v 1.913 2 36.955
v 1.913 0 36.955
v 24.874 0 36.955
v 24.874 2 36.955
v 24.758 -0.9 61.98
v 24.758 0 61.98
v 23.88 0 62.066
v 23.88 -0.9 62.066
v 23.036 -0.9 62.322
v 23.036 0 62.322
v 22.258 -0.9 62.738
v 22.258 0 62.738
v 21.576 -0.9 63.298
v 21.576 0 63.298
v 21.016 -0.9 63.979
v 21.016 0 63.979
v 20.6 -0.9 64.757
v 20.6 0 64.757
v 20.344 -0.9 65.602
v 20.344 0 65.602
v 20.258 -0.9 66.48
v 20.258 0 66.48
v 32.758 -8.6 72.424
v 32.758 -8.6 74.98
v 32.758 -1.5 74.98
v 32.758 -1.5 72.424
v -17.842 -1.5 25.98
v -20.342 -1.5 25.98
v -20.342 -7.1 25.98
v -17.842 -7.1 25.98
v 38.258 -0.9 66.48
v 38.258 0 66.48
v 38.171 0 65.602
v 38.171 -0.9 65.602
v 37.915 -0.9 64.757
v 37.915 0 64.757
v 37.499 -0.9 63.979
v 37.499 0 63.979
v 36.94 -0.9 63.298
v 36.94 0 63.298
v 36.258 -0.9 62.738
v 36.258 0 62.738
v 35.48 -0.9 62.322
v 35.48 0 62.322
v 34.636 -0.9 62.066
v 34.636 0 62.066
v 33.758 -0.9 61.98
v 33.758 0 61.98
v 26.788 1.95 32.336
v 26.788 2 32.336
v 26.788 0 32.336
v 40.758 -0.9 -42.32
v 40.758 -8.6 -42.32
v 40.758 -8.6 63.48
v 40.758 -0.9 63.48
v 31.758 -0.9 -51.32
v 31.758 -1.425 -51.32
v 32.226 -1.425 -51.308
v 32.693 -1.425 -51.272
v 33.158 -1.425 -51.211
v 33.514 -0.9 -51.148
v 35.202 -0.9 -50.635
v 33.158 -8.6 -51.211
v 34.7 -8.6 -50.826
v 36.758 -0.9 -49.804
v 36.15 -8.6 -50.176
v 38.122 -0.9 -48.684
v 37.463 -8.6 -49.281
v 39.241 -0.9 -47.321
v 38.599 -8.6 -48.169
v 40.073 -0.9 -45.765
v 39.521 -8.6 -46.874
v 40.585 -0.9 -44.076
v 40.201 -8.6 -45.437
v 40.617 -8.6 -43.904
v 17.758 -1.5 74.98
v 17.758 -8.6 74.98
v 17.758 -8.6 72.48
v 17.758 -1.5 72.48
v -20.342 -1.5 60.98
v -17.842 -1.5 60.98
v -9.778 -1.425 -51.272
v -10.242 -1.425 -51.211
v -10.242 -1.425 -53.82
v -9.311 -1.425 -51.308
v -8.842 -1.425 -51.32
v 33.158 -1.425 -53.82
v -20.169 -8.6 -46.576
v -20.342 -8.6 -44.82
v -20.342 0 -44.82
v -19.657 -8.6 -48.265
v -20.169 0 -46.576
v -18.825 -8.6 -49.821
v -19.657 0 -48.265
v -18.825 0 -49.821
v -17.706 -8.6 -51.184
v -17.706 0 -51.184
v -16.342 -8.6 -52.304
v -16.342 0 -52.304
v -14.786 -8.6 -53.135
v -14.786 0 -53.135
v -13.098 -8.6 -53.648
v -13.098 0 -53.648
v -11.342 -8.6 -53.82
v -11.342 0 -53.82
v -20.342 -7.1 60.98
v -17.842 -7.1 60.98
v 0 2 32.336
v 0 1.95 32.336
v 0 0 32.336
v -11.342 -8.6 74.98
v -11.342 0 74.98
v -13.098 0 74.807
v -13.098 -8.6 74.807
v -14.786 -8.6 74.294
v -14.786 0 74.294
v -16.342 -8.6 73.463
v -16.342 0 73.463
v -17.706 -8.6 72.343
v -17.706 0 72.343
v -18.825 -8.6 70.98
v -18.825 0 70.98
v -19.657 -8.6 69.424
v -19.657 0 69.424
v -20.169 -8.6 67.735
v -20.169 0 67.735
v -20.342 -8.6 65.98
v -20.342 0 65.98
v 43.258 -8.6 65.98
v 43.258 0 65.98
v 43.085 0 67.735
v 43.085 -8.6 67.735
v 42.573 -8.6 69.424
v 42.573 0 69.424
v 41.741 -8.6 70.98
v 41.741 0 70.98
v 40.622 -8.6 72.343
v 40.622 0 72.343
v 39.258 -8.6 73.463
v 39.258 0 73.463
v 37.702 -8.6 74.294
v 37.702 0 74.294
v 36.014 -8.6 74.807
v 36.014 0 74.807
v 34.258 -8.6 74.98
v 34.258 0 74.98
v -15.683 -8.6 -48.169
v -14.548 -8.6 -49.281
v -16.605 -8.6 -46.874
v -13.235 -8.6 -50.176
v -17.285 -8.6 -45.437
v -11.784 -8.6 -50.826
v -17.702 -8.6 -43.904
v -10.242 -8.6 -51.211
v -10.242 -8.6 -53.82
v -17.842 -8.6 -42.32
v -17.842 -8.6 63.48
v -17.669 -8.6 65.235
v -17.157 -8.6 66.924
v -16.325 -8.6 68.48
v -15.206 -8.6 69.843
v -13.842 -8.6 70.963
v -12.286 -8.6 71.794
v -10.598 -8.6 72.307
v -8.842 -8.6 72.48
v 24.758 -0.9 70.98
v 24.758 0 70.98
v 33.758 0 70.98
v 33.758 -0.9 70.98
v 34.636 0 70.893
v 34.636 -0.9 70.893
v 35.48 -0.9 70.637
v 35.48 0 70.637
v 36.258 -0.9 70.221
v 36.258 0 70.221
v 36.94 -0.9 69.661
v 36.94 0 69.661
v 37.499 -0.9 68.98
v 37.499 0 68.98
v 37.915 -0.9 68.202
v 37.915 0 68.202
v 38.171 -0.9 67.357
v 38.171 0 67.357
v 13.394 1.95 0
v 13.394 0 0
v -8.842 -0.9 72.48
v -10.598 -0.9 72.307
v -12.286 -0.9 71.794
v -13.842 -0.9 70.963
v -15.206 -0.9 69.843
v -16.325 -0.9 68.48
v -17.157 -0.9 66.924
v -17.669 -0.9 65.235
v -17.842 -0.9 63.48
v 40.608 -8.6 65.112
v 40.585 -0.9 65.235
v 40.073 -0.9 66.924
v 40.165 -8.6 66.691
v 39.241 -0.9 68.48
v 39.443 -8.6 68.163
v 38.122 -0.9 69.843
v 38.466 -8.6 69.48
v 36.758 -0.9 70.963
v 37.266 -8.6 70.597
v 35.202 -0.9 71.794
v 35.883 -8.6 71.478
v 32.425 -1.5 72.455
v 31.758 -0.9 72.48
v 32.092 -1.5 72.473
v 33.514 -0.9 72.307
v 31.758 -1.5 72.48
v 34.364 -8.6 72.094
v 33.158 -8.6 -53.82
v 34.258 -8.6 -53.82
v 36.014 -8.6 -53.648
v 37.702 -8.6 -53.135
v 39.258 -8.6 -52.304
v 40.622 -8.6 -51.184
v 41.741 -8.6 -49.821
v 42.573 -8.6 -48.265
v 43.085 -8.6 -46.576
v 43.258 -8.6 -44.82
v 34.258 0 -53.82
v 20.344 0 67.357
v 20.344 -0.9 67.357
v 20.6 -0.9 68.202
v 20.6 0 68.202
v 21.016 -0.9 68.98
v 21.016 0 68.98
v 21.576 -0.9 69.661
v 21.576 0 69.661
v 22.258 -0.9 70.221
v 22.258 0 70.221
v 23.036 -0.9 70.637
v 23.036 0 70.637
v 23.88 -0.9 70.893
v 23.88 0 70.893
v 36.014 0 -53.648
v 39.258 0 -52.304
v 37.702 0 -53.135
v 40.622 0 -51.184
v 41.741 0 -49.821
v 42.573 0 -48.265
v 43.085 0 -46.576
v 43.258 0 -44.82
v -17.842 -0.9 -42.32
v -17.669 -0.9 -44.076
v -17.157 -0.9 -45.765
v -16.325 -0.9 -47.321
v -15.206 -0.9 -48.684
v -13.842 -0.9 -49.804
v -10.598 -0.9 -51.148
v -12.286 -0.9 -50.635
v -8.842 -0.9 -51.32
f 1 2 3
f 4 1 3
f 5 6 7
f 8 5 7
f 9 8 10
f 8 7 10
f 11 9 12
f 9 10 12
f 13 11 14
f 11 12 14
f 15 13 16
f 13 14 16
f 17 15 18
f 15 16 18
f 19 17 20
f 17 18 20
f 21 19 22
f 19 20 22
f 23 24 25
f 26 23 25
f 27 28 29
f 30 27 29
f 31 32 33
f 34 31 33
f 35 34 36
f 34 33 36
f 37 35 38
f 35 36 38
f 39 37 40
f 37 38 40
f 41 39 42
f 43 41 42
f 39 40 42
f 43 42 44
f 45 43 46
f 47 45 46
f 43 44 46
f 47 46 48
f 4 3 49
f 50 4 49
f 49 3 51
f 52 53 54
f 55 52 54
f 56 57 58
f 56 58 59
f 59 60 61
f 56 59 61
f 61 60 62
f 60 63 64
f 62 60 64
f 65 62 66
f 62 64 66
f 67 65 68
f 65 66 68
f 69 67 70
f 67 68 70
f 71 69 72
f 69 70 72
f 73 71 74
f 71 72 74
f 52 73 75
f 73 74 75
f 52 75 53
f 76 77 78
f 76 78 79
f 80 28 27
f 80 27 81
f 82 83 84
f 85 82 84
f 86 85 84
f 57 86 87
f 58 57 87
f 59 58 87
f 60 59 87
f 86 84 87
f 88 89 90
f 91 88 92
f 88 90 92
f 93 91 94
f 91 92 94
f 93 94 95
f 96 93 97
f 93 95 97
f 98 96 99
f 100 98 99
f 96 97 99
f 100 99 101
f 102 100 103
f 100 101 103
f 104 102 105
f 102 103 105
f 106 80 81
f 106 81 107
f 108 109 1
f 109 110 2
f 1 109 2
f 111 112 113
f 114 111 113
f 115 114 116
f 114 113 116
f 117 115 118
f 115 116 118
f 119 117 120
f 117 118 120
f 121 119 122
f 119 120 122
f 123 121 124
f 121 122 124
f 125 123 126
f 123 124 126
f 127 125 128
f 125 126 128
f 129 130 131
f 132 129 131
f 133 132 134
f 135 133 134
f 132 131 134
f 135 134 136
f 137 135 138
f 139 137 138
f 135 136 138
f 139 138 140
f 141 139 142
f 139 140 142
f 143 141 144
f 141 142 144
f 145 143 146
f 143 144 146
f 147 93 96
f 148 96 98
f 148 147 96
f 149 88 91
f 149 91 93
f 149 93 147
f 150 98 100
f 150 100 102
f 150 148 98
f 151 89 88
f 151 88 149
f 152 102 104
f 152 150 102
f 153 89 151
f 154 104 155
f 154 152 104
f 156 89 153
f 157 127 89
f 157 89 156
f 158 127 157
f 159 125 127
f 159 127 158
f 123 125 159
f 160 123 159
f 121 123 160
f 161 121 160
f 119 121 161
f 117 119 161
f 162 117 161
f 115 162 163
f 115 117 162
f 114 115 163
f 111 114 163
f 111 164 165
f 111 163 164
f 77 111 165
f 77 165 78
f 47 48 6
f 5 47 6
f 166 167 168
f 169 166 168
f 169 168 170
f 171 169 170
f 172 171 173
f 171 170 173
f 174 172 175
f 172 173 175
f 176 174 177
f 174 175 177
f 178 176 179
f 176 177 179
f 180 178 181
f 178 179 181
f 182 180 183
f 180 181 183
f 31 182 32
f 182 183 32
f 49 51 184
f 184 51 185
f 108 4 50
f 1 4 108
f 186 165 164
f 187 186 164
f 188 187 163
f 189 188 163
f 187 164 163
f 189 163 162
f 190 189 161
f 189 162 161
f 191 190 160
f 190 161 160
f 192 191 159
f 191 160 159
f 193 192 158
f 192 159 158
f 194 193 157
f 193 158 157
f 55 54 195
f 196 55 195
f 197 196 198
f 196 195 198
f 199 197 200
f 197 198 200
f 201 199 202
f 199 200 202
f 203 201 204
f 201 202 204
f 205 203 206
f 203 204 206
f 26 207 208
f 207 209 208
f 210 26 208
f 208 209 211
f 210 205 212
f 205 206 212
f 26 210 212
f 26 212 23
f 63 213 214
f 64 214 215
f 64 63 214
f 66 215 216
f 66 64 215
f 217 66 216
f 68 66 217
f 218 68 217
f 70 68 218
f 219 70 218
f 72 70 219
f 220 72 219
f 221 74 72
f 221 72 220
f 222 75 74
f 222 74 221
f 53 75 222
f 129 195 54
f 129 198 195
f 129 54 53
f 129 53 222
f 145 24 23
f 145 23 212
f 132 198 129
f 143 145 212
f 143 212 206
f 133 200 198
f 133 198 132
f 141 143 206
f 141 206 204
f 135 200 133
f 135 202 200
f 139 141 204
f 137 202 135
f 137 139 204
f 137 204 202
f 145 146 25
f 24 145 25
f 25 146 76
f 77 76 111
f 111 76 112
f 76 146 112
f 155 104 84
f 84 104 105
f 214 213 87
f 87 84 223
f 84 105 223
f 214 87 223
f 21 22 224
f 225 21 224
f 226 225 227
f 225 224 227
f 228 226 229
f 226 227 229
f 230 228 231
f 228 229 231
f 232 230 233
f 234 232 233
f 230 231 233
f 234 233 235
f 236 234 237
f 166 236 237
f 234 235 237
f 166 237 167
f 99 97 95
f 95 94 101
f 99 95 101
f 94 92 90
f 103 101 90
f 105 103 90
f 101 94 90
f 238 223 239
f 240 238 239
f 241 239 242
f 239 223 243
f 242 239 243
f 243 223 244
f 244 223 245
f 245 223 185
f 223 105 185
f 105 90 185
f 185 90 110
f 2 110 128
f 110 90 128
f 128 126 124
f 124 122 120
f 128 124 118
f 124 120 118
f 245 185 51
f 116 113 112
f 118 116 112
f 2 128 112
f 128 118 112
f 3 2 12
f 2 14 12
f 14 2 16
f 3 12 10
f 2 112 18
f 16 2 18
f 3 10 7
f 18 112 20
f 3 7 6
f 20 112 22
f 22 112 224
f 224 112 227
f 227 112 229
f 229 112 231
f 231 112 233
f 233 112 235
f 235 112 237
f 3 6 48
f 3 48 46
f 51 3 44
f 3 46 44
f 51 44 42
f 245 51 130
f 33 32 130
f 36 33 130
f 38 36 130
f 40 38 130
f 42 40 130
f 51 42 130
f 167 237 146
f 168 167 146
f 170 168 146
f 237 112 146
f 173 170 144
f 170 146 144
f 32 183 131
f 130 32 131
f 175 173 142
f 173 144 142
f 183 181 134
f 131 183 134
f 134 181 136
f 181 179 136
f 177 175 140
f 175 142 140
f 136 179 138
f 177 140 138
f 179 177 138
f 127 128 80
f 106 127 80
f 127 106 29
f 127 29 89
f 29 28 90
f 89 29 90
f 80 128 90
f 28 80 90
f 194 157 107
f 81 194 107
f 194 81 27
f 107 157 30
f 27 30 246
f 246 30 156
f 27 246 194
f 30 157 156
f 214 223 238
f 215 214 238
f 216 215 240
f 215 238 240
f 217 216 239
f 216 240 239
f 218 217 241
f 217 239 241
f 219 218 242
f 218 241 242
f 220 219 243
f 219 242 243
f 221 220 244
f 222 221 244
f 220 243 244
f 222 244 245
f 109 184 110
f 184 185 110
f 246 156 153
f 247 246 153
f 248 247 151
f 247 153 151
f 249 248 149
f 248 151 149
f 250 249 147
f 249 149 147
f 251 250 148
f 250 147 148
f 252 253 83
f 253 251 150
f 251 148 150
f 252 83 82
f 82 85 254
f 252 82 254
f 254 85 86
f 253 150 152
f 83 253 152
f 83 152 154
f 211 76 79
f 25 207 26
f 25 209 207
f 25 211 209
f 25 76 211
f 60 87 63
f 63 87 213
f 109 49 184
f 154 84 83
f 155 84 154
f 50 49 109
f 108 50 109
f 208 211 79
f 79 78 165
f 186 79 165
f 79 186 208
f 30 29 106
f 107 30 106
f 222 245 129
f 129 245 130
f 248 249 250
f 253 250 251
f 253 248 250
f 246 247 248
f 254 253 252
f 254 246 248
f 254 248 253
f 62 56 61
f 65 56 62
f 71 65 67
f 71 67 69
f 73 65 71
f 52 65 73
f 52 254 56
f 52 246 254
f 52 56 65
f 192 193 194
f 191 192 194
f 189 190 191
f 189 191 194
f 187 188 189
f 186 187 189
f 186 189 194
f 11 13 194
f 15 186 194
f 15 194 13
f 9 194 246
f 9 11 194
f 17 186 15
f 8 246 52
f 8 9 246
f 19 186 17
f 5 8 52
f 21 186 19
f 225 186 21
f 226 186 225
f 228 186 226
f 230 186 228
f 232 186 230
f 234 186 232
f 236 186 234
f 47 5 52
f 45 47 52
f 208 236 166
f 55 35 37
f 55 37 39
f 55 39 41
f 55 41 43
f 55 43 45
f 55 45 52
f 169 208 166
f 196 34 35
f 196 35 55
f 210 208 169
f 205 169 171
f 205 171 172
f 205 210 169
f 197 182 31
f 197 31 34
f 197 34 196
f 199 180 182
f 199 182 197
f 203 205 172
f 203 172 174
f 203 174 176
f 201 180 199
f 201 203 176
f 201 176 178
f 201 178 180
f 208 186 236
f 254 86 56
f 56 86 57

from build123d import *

# Parameters (mm, degrees)
F1_DEPTH  = 8.6
F3_DEPTH  = 7.7
F5_DEPTH  = 5
F7_DEPTH  = 1
F8_W      = 43.4
F8_H      = 7.1749998596
F9_DEPTH  = 25
F10_W     = 15
F10_H     = 7.1
F11_DEPTH = 25
F12_W     = 5.6
F12_H     = 35
F13_DEPTH = 25
F15_DEPTH = 1
F17_DEPTH = 0.95


# Not quite as in the source:
# - a feature names something its author has since deleted; it is built from what else it names


with BuildPart() as f1:
    # F0 (on Front) → F1 (new body)
    with BuildSketch(Plane.XZ):
        with BuildLine():
            Line((34.2577553943, 74.9795119995), (-11.3422446057, 74.9795119995))
            ThreePointArc((-11.3422446057, 74.9795119995), (-17.7062056364, 72.3434730302), (-20.3422446057, 65.9795119995))
            Line((-20.3422446057, 65.9795119995), (-20.3422446057, -44.8204880005))
            ThreePointArc((-20.3422446057, -44.8204880005), (-17.7062056364, -51.1844490312), (-11.3422446057, -53.8204880005))
            Line((-11.3422446057, -53.8204880005), (34.2577553943, -53.8204880005))
            ThreePointArc((34.2577553943, -53.8204880005), (40.621716425, -51.1844490312), (43.2577553943, -44.8204880005))
            Line((43.2577553943, -44.8204880005), (43.2577553943, 65.9795119995))
            ThreePointArc((43.2577553943, 65.9795119995), (40.621716425, 72.3434730302), (34.2577553943, 74.9795119995))
        make_face()
    extrude(amount=F1_DEPTH)

    # F2 (on face) → F3 (cut)
    with BuildSketch(Plane.XZ.offset(8.6)):
        with BuildLine():
            Line((31.7577553943, 72.4795119995), (-8.8422446057, 72.4795119995))
            ThreePointArc((-8.8422446057, 72.4795119995), (-15.2062056364, 69.8434730302), (-17.8422446057, 63.4795119995))
            Line((-17.8422446057, 63.4795119995), (-17.8422446057, -42.3204880005))
            ThreePointArc((-17.8422446057, -42.3204880005), (-15.2062056364, -48.6844490312), (-8.8422446057, -51.3204880005))
            Line((-8.8422446057, -51.3204880005), (31.7577553943, -51.3204880005))
            ThreePointArc((31.7577553943, -51.3204880005), (38.121716425, -48.6844490312), (40.7577553943, -42.3204880005))
            Line((40.7577553943, -42.3204880005), (40.7577553943, 63.4795119995))
            ThreePointArc((40.7577553943, 63.4795119995), (38.121716425, 69.8434730302), (31.7577553943, 72.4795119995))
        make_face()
    extrude(amount=-F3_DEPTH, mode=Mode.SUBTRACT)

    # F4 (on face) → F5 (cut)
    with BuildSketch(Plane(origin=(0, 0, 0), x_dir=(-1, 0, 0), z_dir=(0, 1, 0))):
        with BuildLine():
            Line((-24.7577553943, 70.9795119995), (-33.7577553943, 70.9795119995))
            ThreePointArc((-33.7577553943, 70.9795119995), (-36.9397359096, 69.6614925148), (-38.2577553943, 66.4795119995))
            ThreePointArc((-38.2577553943, 66.4795119995), (-36.9397359096, 63.2975314842), (-33.7577553943, 61.9795119995))
            Line((-33.7577553943, 61.9795119995), (-24.7577553943, 61.9795119995))
            ThreePointArc((-24.7577553943, 61.9795119995), (-21.5757748789, 63.2975314842), (-20.2577553943, 66.4795119995))
            ThreePointArc((-20.2577553943, 66.4795119995), (-21.5757748789, 69.6614925148), (-24.7577553943, 70.9795119995))
        make_face()
    extrude(amount=-F5_DEPTH, mode=Mode.SUBTRACT)

    # F6 (on face) → F7 (join)
    with BuildSketch(Plane(origin=(0, 0, 0), x_dir=(-1, 0, 0), z_dir=(0, 1, 0))):
        Polygon((-24.8744231037, 36.9551813005), (-26.7878402656, 32.3357836379), (-13.3939201328, 0), (0, 32.3357836379), (-1.9134171618, 36.9551813005), align=None)
    extrude(amount=F7_DEPTH)

    # F8 (on face) → F9 (cut)
    with BuildSketch(Plane(origin=(0, 0, -53.8204880005), x_dir=(1, 0, 0), z_dir=(0, 0, -1))):
        with Locations((11.4577553943, 5.0125000702)):
            Rectangle(F8_W, F8_H)
    extrude(amount=-F9_DEPTH, mode=Mode.SUBTRACT)

    # F10 (on face) → F11 (cut)
    with BuildSketch(Plane.XY.offset(74.9795119995)):
        with Locations((25.2577553943, -5.05)):
            Rectangle(F10_W, F10_H)
    extrude(amount=-F11_DEPTH, mode=Mode.SUBTRACT)

    # F12 (on face) → F13 (cut)
    with BuildSketch(Plane(origin=(-20.3422446057, 0, 0), x_dir=(0, -1, 0), z_dir=(-1, 0, 0))):
        with Locations((4.3, 43.4795119995)):
            Rectangle(F12_W, F12_H)
    extrude(amount=-F13_DEPTH, mode=Mode.SUBTRACT)

    # F14 (on face) → F15 (join)
    with BuildSketch(Plane(origin=(0, 1, 0), x_dir=(-1, 0, 0), z_dir=(0, 1, 0))):
        Polygon((-24.8744231037, 36.9551813005), (-26.7878402656, 32.3357836379), (0, 32.3357836379), (-1.9134171618, 36.9551813005), align=None)
    extrude(amount=F15_DEPTH)

    # F16 (on face) → F17 (join)
    with BuildSketch(Plane(origin=(0, 1, 0), x_dir=(-1, 0, 0), z_dir=(0, 1, 0))):
        Polygon((0, 32.3357836379), (-26.7878402656, 32.3357836379), (-13.3939201328, 0), align=None)
    extrude(amount=F17_DEPTH)


solid = f1.part
